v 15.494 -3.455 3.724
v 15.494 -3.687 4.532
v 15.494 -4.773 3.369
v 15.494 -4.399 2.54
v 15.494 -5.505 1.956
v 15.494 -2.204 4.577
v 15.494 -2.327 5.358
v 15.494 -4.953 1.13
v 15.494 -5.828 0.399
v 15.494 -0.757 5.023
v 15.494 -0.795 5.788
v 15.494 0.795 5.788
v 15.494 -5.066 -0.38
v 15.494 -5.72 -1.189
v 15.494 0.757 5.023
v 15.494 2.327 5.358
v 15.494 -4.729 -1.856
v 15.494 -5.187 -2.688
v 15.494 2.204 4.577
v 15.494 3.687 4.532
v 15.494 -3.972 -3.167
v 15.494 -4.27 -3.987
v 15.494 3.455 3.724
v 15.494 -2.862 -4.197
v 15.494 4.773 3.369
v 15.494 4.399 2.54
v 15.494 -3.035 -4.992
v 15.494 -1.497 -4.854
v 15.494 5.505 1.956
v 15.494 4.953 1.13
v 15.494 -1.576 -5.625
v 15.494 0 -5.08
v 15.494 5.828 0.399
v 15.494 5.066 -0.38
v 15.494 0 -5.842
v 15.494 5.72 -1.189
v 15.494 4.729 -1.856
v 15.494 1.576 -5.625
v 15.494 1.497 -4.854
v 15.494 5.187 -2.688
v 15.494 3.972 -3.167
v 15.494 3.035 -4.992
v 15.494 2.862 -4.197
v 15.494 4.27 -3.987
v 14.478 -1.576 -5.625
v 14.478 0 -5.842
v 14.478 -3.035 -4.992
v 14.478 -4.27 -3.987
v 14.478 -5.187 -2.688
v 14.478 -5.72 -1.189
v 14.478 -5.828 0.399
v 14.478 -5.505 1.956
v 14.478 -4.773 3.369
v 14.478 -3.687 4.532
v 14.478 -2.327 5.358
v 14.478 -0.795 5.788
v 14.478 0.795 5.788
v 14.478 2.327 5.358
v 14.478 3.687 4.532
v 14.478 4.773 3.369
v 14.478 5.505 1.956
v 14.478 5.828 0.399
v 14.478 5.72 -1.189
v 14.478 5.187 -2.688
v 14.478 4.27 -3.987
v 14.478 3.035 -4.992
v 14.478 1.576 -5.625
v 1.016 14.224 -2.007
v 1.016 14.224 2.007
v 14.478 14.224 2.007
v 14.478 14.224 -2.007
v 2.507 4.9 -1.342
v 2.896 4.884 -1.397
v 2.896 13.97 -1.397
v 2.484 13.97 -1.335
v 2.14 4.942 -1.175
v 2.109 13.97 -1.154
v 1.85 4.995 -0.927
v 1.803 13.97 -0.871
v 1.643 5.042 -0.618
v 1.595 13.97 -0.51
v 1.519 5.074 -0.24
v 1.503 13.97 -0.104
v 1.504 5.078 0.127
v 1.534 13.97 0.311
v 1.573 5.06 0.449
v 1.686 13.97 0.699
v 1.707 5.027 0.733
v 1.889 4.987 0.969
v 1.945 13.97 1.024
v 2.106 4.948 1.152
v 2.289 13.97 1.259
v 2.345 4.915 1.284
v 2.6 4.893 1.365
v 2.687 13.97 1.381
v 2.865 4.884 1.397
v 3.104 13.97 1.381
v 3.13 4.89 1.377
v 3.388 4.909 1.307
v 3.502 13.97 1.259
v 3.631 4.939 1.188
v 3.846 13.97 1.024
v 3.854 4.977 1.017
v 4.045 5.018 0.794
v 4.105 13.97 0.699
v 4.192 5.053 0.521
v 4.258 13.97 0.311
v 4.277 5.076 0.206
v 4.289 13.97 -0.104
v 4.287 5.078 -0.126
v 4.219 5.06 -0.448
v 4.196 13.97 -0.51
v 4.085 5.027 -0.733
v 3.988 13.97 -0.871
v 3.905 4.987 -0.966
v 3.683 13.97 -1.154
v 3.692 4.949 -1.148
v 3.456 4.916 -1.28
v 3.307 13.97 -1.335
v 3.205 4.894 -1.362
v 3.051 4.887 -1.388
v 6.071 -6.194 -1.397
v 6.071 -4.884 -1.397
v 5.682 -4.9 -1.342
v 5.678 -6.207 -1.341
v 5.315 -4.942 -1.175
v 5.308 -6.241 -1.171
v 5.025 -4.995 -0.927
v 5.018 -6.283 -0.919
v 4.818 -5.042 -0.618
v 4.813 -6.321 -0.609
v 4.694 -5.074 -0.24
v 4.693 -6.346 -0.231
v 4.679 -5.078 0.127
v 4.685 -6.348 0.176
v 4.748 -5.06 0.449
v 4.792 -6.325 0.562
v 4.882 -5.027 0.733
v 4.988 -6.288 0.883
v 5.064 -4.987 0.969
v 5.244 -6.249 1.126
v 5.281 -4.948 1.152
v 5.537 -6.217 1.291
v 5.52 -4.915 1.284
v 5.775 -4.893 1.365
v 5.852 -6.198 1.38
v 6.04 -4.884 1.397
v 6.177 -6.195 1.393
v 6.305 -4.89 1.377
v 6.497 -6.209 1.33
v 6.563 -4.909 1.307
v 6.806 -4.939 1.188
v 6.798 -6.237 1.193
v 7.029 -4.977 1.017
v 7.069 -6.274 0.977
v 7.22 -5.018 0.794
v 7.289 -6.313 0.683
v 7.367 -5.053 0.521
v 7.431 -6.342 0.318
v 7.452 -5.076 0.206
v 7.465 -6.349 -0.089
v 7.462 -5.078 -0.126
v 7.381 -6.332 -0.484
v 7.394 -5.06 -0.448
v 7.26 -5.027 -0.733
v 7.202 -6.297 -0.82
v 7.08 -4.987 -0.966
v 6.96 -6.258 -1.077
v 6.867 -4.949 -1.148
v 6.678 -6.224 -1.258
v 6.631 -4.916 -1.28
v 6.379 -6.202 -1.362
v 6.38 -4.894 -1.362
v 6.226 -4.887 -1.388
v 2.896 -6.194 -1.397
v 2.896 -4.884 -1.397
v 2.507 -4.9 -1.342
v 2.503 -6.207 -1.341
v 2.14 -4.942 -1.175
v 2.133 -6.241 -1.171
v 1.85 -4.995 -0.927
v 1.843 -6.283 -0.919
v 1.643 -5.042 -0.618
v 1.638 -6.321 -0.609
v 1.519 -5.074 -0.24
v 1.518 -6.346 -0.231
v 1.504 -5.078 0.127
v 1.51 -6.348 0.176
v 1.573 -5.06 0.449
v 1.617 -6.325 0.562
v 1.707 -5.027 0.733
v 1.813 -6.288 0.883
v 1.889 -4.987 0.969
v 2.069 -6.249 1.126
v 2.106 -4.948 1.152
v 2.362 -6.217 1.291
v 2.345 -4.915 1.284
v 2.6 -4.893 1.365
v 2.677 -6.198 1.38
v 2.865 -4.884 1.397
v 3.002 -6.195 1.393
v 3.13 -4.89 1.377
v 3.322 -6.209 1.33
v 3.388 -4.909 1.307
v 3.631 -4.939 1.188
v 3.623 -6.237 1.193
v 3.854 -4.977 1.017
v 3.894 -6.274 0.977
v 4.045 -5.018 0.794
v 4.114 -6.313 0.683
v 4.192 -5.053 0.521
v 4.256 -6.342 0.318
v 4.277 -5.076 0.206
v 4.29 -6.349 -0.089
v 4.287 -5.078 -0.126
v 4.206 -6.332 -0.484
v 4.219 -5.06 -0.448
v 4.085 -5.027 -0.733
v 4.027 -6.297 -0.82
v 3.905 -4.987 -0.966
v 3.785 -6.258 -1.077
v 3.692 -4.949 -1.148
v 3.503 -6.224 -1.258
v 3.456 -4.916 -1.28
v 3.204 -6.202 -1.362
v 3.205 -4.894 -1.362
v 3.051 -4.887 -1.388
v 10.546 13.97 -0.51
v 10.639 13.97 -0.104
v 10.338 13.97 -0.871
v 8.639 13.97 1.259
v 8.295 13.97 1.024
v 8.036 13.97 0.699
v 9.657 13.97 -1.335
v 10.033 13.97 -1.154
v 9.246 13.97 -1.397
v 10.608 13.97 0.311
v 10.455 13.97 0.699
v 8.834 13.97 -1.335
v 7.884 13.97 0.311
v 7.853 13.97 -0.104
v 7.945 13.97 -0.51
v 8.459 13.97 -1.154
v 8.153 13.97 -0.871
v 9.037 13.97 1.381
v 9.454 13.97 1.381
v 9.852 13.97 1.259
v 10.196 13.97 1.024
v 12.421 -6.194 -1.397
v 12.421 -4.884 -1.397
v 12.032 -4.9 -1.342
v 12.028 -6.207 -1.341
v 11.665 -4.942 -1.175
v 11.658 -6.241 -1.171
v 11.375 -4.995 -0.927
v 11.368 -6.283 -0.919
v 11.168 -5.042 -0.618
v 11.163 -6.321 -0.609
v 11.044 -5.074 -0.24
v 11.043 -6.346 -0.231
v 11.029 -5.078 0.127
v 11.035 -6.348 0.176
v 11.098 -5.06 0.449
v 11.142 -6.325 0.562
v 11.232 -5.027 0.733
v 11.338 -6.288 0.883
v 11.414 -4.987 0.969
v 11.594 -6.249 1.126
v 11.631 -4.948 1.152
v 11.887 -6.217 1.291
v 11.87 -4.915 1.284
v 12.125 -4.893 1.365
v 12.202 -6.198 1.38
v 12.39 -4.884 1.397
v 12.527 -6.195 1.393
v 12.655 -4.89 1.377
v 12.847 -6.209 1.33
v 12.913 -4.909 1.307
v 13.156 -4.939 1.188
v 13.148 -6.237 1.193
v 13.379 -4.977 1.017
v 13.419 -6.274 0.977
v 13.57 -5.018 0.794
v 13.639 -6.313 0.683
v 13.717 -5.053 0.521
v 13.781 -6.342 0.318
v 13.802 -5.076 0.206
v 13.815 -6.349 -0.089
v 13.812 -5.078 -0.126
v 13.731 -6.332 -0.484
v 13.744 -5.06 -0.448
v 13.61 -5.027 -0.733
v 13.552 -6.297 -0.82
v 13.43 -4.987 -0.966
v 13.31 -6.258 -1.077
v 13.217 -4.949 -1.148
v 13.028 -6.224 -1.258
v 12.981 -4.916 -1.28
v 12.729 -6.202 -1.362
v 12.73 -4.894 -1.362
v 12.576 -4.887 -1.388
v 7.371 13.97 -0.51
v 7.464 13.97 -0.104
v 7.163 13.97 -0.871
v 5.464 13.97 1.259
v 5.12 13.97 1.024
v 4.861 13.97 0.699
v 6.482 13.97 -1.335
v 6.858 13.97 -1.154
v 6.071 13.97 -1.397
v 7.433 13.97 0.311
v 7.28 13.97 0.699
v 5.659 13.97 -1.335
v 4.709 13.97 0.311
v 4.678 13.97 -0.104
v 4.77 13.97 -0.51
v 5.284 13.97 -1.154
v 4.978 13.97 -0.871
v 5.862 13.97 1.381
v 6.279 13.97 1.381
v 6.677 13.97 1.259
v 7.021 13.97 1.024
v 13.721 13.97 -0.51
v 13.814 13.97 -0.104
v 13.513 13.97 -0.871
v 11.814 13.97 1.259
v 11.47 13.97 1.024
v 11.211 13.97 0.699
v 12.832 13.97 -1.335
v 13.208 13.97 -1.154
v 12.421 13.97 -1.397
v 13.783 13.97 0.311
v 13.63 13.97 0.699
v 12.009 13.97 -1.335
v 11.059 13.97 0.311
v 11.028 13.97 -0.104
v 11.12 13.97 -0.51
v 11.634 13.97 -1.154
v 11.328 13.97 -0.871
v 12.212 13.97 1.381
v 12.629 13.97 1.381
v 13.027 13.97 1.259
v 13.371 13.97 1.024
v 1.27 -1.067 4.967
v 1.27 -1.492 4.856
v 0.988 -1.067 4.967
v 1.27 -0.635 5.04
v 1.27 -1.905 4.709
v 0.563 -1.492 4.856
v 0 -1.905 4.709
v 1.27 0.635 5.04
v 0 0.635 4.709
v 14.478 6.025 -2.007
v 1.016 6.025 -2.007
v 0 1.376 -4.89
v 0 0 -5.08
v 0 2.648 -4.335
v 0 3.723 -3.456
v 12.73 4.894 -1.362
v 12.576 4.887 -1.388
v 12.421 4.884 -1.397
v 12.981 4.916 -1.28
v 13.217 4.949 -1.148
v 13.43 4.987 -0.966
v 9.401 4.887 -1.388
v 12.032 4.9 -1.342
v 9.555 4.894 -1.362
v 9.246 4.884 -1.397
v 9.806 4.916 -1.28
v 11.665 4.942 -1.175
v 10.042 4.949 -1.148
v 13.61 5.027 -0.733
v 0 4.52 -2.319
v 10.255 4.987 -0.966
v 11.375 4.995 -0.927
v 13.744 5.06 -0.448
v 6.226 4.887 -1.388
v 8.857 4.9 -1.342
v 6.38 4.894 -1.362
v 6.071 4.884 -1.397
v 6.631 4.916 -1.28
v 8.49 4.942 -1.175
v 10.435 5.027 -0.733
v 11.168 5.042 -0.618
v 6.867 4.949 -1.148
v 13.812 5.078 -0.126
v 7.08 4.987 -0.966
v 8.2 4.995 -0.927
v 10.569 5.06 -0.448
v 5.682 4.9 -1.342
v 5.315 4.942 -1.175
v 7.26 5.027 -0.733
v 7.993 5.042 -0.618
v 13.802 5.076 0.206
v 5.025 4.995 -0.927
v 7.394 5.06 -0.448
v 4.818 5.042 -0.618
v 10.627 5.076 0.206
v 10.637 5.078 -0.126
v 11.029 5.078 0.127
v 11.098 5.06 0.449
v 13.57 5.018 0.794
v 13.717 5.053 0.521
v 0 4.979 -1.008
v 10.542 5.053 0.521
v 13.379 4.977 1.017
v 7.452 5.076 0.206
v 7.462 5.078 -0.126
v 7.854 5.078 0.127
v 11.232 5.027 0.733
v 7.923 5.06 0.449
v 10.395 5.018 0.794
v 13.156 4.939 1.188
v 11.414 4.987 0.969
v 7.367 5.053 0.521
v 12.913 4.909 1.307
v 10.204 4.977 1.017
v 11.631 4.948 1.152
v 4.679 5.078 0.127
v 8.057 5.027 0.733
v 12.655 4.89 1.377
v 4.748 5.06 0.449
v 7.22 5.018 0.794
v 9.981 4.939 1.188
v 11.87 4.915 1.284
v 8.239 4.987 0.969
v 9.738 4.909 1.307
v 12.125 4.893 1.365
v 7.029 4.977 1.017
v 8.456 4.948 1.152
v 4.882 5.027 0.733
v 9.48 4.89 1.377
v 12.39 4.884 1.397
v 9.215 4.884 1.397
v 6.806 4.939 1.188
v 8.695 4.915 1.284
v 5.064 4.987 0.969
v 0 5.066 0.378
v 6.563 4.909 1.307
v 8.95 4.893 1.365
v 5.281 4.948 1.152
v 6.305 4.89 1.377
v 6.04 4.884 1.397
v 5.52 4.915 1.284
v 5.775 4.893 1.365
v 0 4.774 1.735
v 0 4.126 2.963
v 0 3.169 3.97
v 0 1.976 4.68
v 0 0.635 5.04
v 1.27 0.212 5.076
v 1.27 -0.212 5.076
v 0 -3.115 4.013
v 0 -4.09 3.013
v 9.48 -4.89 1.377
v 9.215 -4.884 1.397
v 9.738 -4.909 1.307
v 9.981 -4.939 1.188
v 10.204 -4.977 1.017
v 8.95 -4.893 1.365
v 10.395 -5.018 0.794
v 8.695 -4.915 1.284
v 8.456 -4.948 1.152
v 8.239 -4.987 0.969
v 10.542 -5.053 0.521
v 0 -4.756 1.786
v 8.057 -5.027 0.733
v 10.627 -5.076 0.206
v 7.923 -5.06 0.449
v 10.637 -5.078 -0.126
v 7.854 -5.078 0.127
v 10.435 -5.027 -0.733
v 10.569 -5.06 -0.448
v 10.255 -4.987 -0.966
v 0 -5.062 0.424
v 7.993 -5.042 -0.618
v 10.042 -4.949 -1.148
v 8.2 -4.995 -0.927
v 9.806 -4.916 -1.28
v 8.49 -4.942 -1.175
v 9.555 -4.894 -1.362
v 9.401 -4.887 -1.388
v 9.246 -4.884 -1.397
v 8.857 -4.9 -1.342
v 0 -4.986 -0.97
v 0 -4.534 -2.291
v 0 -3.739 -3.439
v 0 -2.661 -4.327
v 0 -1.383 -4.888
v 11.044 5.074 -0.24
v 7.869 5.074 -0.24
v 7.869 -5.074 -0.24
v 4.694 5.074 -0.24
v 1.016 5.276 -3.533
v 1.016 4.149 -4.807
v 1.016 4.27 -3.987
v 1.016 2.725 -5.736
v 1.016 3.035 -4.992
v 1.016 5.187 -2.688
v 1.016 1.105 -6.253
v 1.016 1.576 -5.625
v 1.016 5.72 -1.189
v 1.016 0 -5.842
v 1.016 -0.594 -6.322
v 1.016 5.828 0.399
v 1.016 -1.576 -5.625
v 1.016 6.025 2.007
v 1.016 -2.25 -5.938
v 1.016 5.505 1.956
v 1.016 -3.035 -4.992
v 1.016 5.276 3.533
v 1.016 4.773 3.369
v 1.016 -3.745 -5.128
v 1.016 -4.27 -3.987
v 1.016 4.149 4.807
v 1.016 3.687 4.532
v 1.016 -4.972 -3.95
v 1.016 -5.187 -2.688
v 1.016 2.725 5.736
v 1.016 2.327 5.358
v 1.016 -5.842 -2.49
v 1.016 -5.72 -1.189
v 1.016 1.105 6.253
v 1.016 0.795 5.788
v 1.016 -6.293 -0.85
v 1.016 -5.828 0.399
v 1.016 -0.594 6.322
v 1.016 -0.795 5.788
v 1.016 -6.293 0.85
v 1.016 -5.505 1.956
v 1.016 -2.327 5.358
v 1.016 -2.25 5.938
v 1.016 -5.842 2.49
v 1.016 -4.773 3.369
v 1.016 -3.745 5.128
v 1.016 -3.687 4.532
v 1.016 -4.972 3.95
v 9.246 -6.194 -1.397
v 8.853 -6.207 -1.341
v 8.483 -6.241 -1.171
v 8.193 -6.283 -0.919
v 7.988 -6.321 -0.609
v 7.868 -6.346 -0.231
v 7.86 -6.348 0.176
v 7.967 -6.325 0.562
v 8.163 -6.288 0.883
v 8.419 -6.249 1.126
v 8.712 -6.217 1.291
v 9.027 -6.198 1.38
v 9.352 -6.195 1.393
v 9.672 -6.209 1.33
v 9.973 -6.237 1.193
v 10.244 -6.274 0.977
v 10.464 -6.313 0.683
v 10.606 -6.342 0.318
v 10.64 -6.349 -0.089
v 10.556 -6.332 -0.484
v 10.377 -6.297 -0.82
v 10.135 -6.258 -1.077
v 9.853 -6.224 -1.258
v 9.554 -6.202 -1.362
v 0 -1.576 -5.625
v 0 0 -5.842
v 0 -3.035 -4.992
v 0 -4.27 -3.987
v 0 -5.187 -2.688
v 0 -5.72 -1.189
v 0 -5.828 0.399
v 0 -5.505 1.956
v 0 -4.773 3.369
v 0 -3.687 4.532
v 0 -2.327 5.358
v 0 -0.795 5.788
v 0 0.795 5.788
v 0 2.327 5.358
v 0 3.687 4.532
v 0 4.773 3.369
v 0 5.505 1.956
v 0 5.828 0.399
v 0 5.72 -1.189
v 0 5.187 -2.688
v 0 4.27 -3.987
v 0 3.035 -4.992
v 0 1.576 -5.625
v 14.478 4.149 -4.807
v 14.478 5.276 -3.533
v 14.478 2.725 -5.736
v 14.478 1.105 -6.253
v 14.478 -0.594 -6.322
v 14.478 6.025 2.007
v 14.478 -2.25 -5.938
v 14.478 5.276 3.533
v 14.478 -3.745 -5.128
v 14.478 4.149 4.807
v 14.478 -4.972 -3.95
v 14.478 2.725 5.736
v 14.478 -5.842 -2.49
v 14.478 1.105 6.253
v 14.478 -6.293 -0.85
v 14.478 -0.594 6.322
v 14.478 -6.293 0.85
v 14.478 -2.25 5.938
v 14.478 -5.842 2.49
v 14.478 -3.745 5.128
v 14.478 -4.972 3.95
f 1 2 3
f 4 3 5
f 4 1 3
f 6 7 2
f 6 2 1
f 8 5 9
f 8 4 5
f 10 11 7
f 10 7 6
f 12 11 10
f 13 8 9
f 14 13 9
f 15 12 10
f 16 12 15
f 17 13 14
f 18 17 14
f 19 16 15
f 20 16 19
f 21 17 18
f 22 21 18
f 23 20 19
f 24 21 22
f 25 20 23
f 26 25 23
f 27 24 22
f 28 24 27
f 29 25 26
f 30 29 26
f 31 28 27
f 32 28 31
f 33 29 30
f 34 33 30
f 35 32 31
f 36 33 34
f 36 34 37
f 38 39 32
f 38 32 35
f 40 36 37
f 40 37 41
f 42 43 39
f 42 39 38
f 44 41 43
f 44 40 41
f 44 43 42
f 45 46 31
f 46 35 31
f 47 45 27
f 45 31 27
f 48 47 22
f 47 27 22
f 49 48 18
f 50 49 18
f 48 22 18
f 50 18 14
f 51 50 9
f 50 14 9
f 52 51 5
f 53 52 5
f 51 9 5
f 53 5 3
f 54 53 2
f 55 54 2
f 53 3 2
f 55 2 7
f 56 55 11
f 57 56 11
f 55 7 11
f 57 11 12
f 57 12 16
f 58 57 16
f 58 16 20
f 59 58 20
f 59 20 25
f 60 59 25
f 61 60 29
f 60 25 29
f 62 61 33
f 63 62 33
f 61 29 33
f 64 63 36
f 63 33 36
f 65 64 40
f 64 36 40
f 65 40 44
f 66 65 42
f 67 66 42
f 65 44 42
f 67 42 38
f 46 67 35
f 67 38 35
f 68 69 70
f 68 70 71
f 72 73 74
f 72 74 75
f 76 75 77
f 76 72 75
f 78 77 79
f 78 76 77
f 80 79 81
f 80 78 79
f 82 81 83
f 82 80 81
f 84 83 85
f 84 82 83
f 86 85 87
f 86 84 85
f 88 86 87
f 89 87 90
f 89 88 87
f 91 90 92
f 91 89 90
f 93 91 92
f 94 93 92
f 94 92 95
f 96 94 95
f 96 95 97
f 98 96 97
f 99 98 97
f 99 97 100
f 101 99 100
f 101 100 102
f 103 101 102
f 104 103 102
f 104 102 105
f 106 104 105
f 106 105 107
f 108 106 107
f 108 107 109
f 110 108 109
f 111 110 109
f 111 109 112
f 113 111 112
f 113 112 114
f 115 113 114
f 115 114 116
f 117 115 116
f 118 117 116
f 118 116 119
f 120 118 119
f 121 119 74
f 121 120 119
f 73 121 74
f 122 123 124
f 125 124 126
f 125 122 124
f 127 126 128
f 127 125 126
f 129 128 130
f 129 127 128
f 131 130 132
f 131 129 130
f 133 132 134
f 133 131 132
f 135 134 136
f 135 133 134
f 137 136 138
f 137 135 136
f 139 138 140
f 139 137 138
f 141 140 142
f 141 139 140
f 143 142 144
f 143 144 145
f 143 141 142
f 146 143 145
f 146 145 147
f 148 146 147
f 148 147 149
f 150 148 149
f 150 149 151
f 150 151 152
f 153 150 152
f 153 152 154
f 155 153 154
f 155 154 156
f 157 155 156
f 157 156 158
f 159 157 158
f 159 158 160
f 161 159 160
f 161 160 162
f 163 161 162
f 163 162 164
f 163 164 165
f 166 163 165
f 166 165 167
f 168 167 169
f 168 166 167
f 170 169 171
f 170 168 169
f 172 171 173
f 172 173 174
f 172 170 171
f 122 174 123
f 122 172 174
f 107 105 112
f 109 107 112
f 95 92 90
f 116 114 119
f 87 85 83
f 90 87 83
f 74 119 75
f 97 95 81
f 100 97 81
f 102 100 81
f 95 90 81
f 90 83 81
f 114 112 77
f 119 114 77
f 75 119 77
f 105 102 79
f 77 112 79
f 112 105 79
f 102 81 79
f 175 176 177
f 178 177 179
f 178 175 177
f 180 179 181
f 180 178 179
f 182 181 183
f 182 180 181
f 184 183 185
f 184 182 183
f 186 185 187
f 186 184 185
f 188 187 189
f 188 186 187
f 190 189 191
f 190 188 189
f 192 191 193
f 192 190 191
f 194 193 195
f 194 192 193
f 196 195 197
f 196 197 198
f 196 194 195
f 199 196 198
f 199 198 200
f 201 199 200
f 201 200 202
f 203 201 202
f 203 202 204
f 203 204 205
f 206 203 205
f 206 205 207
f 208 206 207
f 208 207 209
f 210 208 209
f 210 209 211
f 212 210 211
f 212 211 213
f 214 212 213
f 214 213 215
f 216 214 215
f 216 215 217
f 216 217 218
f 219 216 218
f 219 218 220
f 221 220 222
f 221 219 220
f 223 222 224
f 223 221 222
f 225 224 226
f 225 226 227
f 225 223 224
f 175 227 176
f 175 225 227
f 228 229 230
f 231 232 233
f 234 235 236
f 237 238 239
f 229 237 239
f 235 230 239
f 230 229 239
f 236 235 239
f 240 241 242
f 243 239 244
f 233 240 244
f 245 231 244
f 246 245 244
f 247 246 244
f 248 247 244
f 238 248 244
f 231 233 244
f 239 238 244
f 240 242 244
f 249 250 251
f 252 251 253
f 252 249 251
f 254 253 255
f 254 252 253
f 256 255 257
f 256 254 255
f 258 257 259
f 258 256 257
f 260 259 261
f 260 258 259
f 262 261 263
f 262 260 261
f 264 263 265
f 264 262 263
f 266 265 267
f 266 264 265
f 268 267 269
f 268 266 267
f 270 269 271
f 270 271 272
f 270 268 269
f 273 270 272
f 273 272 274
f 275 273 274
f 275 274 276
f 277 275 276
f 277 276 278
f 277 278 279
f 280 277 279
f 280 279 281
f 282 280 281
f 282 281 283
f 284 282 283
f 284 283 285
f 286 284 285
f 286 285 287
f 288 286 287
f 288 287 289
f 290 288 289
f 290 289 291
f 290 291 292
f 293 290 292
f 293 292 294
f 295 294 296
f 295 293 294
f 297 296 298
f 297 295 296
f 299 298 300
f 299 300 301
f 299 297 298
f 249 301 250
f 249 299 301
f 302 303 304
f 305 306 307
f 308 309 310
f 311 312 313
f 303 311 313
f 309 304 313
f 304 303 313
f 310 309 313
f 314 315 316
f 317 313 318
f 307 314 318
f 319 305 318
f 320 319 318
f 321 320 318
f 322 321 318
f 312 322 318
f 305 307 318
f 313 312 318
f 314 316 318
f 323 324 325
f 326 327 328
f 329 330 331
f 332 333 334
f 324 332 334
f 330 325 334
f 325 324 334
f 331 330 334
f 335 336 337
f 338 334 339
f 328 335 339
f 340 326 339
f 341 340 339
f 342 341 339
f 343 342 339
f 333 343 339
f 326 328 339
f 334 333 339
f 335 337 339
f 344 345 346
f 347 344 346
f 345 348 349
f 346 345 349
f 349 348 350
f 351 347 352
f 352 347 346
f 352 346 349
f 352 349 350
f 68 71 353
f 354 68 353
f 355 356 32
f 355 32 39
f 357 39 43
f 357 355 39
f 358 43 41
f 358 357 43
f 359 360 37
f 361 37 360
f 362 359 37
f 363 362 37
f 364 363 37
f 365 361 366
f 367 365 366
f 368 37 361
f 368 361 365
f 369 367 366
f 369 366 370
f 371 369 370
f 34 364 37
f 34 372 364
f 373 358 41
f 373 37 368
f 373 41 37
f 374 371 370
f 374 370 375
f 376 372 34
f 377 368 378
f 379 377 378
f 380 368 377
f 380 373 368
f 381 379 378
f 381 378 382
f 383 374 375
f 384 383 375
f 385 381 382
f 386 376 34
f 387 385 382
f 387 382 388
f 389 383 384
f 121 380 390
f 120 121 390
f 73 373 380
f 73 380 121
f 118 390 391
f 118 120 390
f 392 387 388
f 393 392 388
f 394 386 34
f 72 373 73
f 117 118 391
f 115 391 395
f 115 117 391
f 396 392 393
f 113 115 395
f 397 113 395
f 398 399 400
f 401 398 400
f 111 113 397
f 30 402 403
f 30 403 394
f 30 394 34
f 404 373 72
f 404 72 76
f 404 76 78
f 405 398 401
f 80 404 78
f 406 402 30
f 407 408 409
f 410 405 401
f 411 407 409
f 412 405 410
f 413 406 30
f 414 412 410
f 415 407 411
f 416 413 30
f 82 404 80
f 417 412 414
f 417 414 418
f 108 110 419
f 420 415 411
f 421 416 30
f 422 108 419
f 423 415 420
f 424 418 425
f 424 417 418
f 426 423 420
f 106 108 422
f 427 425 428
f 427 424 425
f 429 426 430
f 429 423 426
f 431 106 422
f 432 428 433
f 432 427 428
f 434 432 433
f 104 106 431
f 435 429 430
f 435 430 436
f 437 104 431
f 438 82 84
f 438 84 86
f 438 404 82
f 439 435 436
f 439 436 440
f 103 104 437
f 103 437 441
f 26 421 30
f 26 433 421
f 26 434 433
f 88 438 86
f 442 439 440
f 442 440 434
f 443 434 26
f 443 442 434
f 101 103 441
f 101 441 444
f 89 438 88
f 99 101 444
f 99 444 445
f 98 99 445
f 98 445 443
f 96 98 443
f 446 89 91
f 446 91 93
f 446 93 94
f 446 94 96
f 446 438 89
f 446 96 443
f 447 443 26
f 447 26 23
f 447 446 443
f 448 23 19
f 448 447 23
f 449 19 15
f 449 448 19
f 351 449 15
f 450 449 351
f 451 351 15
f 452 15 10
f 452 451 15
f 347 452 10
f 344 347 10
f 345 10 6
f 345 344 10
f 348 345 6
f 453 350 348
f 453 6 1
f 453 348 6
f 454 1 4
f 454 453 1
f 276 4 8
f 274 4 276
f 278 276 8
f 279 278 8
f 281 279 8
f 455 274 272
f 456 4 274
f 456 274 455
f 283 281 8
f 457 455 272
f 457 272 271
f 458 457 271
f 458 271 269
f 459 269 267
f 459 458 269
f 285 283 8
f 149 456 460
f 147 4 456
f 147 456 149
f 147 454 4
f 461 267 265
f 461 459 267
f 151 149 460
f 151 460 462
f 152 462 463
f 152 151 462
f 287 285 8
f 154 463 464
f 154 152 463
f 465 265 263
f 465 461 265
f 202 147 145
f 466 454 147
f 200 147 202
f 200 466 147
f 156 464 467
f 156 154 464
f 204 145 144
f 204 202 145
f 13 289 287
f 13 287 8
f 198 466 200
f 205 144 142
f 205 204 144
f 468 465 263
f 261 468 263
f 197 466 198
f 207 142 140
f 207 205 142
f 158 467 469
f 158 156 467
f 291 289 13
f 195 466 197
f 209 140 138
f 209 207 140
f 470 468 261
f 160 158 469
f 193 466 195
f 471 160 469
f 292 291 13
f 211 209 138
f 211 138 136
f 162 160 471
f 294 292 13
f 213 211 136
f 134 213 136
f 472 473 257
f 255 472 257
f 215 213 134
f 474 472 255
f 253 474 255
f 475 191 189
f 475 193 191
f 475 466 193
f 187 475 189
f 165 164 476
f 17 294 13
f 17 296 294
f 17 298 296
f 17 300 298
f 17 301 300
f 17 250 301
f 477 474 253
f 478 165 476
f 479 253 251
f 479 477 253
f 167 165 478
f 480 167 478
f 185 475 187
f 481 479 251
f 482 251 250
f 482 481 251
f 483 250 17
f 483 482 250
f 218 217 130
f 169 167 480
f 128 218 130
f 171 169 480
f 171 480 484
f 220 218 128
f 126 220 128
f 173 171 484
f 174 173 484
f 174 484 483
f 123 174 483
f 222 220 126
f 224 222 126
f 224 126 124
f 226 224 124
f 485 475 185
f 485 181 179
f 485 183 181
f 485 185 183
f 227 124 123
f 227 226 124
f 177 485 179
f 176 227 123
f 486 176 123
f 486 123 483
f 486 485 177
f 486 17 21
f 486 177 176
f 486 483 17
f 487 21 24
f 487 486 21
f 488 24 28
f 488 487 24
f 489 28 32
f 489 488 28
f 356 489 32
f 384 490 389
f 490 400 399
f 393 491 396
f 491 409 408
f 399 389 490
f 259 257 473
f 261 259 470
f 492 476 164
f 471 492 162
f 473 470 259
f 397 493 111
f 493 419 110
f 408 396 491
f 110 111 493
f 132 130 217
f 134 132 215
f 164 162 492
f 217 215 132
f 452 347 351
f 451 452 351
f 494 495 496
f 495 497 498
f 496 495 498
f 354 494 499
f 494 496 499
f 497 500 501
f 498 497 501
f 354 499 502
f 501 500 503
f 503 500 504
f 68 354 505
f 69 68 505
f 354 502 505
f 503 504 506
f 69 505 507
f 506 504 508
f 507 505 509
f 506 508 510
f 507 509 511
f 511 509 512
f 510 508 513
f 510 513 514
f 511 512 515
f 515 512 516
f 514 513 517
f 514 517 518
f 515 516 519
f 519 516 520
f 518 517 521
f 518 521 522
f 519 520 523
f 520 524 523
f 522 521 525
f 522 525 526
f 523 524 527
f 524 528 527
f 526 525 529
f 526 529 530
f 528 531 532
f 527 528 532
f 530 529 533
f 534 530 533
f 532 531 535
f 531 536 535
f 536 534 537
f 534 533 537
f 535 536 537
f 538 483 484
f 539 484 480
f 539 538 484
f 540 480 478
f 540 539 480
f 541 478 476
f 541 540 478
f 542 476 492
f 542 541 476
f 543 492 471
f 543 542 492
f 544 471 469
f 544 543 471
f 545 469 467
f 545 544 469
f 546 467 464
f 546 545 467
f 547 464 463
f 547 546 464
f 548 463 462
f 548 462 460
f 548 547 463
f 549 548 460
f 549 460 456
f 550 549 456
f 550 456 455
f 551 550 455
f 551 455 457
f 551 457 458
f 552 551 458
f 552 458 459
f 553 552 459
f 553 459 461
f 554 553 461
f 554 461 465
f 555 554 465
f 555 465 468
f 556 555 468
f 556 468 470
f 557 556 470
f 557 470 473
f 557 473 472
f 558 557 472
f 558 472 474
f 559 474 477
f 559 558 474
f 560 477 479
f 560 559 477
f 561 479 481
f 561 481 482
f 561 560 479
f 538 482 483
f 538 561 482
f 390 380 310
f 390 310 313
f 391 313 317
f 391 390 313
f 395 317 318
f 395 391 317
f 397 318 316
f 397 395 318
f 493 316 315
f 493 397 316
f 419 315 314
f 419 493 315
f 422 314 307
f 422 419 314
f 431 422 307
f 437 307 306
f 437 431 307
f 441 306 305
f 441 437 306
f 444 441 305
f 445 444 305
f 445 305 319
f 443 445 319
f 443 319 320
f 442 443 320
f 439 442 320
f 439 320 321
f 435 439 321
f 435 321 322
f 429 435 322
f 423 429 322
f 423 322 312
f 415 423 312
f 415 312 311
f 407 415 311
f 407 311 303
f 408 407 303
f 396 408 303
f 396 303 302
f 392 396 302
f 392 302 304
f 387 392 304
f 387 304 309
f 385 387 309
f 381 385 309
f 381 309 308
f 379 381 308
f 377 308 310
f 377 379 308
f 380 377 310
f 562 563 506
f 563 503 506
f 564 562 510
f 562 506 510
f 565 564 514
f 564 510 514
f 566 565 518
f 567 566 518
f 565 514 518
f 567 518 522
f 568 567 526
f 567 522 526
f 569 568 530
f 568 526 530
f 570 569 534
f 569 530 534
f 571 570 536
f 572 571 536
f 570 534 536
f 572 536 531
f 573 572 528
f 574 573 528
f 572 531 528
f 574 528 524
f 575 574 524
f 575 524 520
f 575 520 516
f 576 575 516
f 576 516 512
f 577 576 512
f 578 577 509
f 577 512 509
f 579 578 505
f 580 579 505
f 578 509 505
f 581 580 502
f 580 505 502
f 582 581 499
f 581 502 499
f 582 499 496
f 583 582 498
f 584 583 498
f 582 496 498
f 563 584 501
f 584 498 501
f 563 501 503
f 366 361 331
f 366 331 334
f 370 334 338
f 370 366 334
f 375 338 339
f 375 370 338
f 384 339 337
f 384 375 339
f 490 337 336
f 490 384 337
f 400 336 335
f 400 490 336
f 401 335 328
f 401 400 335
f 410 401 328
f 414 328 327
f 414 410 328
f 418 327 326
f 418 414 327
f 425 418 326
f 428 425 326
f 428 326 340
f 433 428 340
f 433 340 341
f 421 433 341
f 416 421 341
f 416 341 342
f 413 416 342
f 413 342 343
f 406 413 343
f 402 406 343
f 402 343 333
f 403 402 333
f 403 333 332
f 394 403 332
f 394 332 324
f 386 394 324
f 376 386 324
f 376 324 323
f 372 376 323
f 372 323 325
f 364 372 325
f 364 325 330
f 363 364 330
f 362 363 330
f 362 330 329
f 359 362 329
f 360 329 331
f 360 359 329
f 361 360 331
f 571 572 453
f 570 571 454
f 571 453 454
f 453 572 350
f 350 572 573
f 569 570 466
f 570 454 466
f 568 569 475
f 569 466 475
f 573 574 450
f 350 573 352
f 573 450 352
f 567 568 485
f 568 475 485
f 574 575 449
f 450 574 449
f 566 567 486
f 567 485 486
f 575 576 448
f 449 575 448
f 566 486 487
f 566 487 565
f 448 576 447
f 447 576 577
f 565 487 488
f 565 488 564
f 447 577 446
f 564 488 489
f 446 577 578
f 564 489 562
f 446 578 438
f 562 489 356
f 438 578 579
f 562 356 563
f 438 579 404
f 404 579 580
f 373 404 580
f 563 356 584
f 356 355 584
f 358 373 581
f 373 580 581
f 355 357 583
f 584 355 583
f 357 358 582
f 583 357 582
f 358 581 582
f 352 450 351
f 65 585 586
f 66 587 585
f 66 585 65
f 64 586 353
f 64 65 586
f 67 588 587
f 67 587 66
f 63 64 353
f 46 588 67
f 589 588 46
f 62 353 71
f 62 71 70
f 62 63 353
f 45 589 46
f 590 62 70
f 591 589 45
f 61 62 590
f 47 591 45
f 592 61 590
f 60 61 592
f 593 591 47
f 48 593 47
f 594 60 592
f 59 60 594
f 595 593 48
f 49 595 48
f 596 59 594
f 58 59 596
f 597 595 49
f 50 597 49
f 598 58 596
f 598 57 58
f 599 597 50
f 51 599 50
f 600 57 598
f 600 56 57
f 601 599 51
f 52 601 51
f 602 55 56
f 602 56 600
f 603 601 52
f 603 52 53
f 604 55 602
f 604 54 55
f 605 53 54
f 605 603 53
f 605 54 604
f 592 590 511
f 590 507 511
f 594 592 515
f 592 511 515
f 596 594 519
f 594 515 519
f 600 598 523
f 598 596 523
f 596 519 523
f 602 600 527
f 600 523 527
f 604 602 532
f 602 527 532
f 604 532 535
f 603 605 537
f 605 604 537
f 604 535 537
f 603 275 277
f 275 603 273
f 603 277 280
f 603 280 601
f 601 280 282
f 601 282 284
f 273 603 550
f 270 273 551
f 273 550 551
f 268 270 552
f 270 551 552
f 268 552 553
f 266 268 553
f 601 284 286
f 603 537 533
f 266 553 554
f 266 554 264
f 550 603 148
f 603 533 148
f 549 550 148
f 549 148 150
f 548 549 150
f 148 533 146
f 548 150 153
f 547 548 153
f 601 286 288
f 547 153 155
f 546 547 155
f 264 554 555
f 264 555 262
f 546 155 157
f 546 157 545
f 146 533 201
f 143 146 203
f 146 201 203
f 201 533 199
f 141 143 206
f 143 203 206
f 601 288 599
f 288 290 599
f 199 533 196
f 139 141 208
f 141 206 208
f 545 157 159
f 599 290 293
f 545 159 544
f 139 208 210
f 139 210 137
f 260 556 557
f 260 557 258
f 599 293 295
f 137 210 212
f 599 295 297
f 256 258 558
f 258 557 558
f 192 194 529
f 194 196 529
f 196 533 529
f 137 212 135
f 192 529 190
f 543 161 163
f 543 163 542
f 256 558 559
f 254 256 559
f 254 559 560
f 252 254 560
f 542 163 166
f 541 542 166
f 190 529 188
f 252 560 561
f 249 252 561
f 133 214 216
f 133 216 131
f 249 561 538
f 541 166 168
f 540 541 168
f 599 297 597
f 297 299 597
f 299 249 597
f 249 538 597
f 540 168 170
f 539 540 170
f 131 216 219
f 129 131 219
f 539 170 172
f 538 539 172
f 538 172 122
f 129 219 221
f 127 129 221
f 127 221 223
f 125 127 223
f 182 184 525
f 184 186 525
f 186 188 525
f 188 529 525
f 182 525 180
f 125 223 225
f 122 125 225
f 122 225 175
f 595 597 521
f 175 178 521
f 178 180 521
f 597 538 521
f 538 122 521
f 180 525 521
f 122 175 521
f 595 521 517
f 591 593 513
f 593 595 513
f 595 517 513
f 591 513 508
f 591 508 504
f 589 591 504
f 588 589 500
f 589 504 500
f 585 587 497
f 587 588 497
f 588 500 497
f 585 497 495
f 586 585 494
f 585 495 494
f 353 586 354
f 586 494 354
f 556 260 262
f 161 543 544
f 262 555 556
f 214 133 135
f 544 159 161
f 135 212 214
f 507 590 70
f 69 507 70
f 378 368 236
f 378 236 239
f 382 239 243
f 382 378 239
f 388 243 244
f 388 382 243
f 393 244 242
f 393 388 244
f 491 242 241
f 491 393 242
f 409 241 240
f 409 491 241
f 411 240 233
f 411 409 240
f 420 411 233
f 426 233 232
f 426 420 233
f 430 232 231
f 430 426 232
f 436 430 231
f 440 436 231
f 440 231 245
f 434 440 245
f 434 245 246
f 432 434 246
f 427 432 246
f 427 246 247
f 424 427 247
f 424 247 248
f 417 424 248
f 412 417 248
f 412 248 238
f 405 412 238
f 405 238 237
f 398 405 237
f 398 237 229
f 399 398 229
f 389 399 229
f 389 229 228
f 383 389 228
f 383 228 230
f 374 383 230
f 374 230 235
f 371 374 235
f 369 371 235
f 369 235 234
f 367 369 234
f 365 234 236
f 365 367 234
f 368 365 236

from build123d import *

# Parameters (mm, degrees)
SKETCH1_R                      = 6.35
SKETCH1_R_2                    = 5.08
BOSS_EXTRUDE1_DEPTH            = 15.494
BOSS_EXTRUDE2_DEPTH            = 13.462
SKETCH3_W                      = 1.016
SKETCH3_H                      = 0.508
BOSS_EXTRUDE3_DEPTH            = 1.27
SKETCH7_R                      = 1.397
CUT_EXTRUDE1_DEPTH             = 20.32
CUT_EXTRUDE4_REACH             = 23.971
CUT_EXTRUDE4_END_RADIUS        = 5.08
CUT_EXTRUDE4_DIRECTION_2_DEPTH = 0.635


with BuildPart() as part:
    # Sketch1 → Boss-Extrude1 (new body)
    with BuildSketch(Plane(origin=(0, 0, 0), x_dir=(0, 0, -1), z_dir=(1, 0, 0))):
        Circle(SKETCH1_R)
        Circle(SKETCH1_R_2, mode=Mode.SUBTRACT)
    extrude(amount=BOSS_EXTRUDE1_DEPTH)

    # Sketch2 → Boss-Extrude2 (add)
    with BuildSketch(Plane(origin=(1.016, 0, 0), x_dir=(0, 0, -1), z_dir=(1, 0, 0))):
        with BuildLine():
            Line((-2.0066, 6.024620854), (-2.0066, 14.224))
            Line((-2.0066, 14.224), (2.0066, 14.224))
            Line((2.0066, 14.224), (2.0066, 6.024620854))
            ThreePointArc((2.0066, 6.024620854), (0, 6.35), (-2.0066, 6.024620854))
        make_face()
    extrude(amount=BOSS_EXTRUDE2_DEPTH)

    # Sketch3 → Cut-Revolve1 (revolve, cut)
    with BuildSketch(Plane.XY, mode=Mode.PRIVATE) as cut_revolve1_sk:
        with Locations((14.986, 6.096)):
            Rectangle(SKETCH3_W, SKETCH3_H)
        with Locations((0.508, 6.096)):
            Rectangle(SKETCH3_W, SKETCH3_H)
    revolve(cut_revolve1_sk.sketch.rotate(Axis((15.494, 0, 0), (-1, 0, 0)), 90), axis=Axis((15.494, 0, 0), (-1, 0, 0)), mode=Mode.SUBTRACT)

    # Sketch5 → Boss-Extrude3 (add)
    with BuildSketch(Plane.ZY):
        with BuildLine():
            Line((4.709286039, 0.635), (4.709286039, -1.905))
            ThreePointArc((4.709286039, -1.905), (5.037440444, -0.656196444), (5.040156248, 0.635))
            Line((5.040156248, 0.635), (4.709286039, 0.635))
        make_face()
    extrude(amount=-BOSS_EXTRUDE3_DEPTH)

    # Sketch7 → Cut-Extrude1 (cut)
    with BuildSketch(Plane(origin=(0, -6.35, 0), x_dir=(1, 0, 0), z_dir=(0, 1, 0))):
        with Locations(Location((12.4206, 0, 0), (0, 0, 90))):
            Circle(SKETCH7_R)
        with Locations(Location((2.8956, 0, 0), (0, 0, 90))):
            Circle(SKETCH7_R)
        with Locations(Location((6.0706, 0, 0), (0, 0, 90))):
            Circle(SKETCH7_R)
        with Locations(Location((9.2456, 0, 0), (0, 0, 90))):
            Circle(SKETCH7_R)
    extrude(amount=CUT_EXTRUDE1_DEPTH, mode=Mode.SUBTRACT)

    # Cut-Extrude4: up to this cylinder (the profile starts inside it)
    cut_extrude4_end = Plane(origin=(0.846667, 0, 0), z_dir=(-1, 0, 0)) * Cylinder(CUT_EXTRUDE4_END_RADIUS, 59.102, mode=Mode.PRIVATE)
    # Sketch11 → Cut-Extrude4 (cut, up to the surface)
    with BuildSketch(Plane(origin=(0, 0, 0), x_dir=(1, 0, 0), z_dir=(0, 1, 0)), mode=Mode.PRIVATE) as cut_extrude4_sk1:
        Polygon((1.27, -4.709286039), (1.27, -5.040156248), (0, -4.709286039), align=None)
    cut_extrude4_tool1 = extrude(cut_extrude4_sk1.sketch, amount=-CUT_EXTRUDE4_REACH, mode=Mode.PRIVATE) & cut_extrude4_end
    add(cut_extrude4_tool1.solids().sort_by_distance((0.846667, 0, 4.819576))[0], mode=Mode.SUBTRACT)

    # Sketch11 → Cut-Extrude4 direction 2 (cut)
    with BuildSketch(Plane(origin=(0, 0, 0), x_dir=(1, 0, 0), z_dir=(0, 1, 0))):
        Polygon((1.27, -4.709286039), (1.27, -5.040156248), (0, -4.709286039), align=None)
    extrude(amount=CUT_EXTRUDE4_DIRECTION_2_DEPTH, mode=Mode.SUBTRACT)


solid = part.part
